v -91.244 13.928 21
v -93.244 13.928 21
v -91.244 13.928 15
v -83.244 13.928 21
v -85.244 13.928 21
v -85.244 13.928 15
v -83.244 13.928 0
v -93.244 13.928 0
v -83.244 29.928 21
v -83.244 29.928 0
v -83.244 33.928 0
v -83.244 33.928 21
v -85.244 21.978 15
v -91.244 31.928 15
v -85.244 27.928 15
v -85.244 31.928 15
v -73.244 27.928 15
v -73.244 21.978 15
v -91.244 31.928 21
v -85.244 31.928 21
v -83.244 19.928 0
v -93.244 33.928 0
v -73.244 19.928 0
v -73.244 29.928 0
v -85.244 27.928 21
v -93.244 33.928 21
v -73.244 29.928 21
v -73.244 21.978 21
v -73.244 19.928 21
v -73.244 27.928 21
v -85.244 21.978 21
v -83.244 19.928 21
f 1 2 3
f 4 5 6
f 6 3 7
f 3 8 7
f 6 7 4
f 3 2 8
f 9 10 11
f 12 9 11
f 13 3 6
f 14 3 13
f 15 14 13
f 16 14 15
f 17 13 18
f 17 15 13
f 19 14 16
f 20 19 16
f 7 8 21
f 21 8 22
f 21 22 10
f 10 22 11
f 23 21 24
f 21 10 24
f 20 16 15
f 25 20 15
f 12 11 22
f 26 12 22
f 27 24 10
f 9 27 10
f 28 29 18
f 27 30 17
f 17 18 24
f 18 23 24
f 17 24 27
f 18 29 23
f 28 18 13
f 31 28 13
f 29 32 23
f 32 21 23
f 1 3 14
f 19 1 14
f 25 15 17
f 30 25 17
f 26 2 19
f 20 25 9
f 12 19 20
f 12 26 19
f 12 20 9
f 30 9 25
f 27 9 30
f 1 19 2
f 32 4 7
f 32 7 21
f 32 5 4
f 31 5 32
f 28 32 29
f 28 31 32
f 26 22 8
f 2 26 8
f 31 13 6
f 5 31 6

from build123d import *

# Parameters (mm, degrees)
F1_DEPTH = 15
F3_DEPTH = 6


with BuildPart() as f1:
    # F0 (on Top) → F1 (new body)
    with BuildSketch(Plane.XY):
        Polygon((-85.244147, 33.927911), (-93.244147, 33.927911), (-93.244147, 19.927911), (-93.244147, 13.927911), (-83.244147, 13.927911), (-83.244147, 19.927911), (-73.244147, 19.927911), (-73.244147, 29.927911), (-83.244147, 29.927911), (-83.244147, 33.927911), align=None)
    extrude(amount=F1_DEPTH)

    # F2 (on face) → F3 (join)
    with BuildSketch(Plane.XY.offset(15)):
        Polygon((-85.244147, 19.927911), (-85.244147, 13.927911), (-83.244147, 13.927911), (-83.244147, 19.927911), (-73.244147, 19.927911), (-73.244147, 21.978136), (-85.244147, 21.978136), align=None)
        Polygon((-91.244147, 33.927911), (-93.244147, 33.927911), (-93.244147, 31.927911), (-93.244147, 13.927911), (-91.244147, 13.927911), (-91.244147, 31.927911), (-85.244147, 31.927911), (-85.244147, 29.927911), (-85.244147, 27.927911), (-73.244147, 27.927911), (-73.244147, 29.927911), (-83.244147, 29.927911), (-83.244147, 31.927911), (-83.244147, 33.927911), (-85.244147, 33.927911), align=None)
    extrude(amount=F3_DEPTH)


solid = f1.part
